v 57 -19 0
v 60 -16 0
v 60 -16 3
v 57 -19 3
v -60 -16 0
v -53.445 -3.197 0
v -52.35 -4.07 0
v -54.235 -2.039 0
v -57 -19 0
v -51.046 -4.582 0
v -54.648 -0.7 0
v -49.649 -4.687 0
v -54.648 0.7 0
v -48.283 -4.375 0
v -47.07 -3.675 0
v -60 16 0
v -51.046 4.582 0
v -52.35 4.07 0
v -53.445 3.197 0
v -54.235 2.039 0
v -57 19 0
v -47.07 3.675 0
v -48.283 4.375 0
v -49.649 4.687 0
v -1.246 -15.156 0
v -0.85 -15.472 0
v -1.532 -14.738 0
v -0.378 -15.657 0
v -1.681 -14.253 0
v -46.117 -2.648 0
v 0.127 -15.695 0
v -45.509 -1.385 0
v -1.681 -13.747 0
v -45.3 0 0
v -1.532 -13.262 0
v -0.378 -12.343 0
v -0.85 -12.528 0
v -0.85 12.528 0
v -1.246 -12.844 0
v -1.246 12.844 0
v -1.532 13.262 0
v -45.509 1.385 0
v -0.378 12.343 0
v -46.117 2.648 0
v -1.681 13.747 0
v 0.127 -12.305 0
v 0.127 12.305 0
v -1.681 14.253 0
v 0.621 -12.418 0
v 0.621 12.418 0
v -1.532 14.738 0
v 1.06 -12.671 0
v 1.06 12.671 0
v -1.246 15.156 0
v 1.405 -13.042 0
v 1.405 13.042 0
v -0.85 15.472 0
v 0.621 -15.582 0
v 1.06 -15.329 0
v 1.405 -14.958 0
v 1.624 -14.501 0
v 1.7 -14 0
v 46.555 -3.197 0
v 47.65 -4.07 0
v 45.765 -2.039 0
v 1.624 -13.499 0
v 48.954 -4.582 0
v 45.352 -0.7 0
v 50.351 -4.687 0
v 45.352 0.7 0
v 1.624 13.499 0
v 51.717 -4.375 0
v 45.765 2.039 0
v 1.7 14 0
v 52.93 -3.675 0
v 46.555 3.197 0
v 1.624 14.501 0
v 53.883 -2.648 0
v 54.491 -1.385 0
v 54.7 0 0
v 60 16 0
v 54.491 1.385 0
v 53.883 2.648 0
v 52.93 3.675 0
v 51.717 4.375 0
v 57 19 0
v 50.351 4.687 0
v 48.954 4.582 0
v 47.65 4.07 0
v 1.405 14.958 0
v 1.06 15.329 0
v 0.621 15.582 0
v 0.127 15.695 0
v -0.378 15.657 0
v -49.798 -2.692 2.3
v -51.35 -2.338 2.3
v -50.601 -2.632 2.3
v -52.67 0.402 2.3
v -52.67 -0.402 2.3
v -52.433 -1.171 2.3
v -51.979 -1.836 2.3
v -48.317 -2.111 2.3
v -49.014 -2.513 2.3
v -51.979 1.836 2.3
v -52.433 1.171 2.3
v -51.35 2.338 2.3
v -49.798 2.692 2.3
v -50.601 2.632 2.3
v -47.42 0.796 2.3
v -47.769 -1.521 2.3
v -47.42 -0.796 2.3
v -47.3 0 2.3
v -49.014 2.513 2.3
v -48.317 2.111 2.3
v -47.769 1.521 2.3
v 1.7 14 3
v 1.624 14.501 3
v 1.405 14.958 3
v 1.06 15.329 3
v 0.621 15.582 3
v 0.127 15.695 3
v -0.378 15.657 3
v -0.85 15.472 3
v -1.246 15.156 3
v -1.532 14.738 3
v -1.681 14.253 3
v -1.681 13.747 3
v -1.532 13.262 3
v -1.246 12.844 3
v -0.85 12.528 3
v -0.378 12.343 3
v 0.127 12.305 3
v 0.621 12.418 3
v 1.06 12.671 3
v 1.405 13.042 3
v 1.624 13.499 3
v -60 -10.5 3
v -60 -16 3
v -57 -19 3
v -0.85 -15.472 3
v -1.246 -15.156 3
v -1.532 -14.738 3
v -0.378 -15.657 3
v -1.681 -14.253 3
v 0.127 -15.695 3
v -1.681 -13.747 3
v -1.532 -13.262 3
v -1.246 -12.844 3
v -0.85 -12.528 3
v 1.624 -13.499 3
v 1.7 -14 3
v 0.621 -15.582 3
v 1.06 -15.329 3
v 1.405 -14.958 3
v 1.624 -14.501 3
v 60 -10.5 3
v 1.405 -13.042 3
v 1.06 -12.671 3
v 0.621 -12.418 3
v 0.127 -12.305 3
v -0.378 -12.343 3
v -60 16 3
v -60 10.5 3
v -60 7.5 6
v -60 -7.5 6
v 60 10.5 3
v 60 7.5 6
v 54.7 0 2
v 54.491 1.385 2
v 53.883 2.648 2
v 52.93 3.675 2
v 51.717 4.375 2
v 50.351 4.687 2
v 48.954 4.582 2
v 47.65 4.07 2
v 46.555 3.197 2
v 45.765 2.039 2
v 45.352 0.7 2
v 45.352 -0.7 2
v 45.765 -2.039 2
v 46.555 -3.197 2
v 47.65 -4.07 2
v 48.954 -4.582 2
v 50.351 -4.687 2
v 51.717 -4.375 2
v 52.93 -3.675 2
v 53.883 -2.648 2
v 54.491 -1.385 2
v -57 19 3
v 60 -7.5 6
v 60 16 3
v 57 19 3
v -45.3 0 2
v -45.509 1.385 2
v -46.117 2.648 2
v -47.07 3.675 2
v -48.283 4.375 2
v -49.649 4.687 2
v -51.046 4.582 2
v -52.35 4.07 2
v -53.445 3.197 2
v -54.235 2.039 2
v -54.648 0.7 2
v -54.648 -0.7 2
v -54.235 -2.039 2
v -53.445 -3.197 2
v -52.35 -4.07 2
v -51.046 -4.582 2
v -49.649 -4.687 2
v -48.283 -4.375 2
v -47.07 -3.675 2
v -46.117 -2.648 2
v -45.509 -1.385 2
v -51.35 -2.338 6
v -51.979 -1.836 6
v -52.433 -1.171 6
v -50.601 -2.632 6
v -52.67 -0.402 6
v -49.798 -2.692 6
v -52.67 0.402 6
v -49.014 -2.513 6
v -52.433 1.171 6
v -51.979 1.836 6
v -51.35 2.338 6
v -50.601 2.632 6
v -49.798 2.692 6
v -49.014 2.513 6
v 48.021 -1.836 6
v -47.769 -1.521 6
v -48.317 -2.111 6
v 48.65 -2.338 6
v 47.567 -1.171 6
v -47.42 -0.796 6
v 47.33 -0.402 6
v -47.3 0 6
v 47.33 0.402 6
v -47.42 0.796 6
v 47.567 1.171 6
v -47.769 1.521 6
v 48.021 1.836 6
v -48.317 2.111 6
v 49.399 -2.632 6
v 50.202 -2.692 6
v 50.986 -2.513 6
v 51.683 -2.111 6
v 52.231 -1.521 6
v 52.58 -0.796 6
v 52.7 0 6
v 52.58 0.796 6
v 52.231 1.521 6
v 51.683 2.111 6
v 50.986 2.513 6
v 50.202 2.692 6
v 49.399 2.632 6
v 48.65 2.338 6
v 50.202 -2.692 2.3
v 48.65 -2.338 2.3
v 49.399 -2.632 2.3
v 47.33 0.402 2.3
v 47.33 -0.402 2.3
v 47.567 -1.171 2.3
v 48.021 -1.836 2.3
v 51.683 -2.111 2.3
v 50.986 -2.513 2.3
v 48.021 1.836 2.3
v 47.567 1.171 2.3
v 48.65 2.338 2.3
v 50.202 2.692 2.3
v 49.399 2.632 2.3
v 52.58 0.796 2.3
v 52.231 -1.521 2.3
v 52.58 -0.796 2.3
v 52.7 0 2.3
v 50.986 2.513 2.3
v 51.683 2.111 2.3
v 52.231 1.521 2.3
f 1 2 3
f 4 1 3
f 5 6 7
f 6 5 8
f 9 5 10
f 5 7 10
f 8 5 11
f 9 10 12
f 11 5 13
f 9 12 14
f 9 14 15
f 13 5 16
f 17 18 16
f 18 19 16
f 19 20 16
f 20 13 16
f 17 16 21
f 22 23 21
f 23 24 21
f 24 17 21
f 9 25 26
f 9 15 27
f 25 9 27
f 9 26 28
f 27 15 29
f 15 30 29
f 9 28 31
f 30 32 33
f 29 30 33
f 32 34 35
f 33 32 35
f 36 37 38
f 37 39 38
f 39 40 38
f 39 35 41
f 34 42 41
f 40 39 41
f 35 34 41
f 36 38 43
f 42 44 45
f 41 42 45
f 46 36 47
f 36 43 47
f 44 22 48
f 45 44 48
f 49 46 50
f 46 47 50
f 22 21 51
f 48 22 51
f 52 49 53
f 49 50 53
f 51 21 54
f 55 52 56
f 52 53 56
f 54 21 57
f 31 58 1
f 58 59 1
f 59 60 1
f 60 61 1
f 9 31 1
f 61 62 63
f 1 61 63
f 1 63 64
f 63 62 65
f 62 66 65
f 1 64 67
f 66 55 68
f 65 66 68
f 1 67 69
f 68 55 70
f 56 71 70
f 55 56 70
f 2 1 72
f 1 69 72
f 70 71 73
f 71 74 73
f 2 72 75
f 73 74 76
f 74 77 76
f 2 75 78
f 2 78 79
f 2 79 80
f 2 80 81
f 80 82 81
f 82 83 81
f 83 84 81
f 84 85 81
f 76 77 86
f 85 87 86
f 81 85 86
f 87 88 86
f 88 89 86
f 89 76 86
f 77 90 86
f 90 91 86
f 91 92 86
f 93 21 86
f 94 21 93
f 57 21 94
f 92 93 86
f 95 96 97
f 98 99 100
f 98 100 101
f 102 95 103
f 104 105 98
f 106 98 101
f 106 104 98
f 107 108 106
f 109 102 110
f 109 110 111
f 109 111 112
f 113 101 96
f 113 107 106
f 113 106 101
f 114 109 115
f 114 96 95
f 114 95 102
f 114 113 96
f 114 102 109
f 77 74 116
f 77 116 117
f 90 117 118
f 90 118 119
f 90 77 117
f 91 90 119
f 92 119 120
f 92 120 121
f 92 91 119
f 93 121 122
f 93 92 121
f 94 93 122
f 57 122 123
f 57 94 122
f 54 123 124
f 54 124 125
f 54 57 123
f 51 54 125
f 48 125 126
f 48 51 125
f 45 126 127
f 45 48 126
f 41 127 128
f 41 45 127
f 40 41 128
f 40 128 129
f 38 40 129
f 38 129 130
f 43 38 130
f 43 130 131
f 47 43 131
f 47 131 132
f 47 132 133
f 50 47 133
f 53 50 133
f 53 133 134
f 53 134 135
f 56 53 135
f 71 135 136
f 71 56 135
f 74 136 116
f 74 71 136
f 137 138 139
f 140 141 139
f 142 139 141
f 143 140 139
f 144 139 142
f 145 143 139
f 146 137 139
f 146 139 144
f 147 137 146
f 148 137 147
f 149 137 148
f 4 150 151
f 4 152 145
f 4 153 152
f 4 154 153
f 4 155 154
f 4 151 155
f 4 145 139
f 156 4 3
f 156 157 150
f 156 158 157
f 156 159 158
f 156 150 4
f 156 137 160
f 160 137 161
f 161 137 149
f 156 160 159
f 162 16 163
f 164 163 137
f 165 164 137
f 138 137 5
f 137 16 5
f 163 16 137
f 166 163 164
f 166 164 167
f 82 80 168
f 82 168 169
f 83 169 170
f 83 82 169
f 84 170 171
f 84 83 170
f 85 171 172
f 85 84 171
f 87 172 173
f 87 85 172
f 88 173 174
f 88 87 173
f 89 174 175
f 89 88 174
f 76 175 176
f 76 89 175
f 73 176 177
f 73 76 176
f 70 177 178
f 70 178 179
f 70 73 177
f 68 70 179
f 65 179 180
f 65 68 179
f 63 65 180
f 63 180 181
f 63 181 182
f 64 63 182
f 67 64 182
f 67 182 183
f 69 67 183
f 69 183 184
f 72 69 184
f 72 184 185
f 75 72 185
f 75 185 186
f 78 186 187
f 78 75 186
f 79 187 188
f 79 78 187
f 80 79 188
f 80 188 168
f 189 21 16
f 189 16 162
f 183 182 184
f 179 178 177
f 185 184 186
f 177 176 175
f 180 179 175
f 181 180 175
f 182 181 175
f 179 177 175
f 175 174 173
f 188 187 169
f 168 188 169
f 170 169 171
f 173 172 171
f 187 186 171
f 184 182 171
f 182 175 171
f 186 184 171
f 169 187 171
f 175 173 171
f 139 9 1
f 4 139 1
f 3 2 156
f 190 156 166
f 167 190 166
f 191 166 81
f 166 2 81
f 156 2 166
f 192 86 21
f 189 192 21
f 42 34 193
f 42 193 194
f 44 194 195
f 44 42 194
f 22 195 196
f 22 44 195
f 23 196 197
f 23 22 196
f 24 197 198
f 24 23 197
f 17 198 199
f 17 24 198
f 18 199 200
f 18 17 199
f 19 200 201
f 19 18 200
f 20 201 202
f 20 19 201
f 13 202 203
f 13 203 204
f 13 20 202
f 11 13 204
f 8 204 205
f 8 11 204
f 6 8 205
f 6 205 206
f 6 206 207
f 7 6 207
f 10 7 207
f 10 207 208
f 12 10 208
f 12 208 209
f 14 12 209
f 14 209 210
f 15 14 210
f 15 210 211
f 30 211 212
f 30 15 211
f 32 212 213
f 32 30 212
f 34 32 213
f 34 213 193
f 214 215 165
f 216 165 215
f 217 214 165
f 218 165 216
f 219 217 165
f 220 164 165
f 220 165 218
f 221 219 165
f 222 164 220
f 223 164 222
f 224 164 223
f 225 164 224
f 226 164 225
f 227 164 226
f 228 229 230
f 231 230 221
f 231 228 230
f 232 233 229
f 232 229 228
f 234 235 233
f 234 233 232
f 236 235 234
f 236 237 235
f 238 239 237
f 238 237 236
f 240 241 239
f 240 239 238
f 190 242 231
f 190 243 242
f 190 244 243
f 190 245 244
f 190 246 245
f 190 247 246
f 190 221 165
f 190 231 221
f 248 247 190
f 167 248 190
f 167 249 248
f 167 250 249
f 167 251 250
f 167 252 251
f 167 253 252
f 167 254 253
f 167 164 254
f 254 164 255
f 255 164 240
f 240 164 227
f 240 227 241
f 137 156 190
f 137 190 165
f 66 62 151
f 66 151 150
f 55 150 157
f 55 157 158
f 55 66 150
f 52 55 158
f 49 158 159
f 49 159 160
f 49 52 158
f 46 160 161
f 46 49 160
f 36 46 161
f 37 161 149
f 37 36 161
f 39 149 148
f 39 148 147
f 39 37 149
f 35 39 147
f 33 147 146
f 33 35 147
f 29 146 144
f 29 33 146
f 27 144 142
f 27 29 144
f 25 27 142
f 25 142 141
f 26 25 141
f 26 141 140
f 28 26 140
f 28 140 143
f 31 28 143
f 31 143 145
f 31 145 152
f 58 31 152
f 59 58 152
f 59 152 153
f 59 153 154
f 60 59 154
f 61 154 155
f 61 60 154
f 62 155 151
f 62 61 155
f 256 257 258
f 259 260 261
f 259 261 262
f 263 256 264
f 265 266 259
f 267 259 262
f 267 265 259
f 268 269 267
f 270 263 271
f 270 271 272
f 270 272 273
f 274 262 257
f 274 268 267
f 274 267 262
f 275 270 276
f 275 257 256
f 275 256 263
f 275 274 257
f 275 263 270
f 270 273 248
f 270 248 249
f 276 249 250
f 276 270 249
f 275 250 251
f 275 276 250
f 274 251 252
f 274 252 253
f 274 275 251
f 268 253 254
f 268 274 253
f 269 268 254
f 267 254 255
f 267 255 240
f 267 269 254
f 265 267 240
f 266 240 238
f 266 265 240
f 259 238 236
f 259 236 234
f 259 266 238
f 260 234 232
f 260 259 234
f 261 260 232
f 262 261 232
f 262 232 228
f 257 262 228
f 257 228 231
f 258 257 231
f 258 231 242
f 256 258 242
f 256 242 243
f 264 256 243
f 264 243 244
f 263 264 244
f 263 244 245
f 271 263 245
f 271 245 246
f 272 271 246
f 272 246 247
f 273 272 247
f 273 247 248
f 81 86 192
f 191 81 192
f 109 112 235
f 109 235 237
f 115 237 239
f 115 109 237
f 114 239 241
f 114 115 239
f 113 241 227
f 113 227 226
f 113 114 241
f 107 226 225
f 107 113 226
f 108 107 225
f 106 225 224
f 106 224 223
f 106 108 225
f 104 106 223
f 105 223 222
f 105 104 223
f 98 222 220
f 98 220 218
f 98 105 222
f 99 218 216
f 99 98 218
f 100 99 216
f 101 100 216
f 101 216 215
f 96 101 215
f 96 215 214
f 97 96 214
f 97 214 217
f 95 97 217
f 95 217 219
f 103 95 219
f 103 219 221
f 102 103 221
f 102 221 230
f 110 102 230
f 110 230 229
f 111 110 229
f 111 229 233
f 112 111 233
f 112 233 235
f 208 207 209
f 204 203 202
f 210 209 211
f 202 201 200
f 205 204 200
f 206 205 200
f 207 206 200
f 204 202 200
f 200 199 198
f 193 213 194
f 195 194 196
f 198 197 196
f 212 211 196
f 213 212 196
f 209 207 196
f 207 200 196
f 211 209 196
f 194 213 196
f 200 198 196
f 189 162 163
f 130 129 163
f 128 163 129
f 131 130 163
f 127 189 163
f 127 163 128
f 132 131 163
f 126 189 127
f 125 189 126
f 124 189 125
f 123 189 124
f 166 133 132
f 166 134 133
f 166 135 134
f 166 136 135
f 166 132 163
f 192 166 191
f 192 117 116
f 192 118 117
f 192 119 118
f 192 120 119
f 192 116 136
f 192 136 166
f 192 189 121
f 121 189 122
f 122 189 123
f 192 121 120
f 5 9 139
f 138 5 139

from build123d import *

# Parameters (mm, degrees)
F0_R     = 1.7
F1_DEPTH = 3
F0_R_2   = 4.7
F0_R_3   = 2.7
F2_DEPTH = 6
F3_DEPTH = 2
F4_SIZE  = 2.99999
F5_START = 2
F5_DEPTH = 0.3


# Not quite as in the source:
# - a fillet or chamfer is up to 0.001 mm smaller than in the source, because OpenCascade refuses the exact size


with BuildPart() as f1:
    # F0 (on Top) → F1 (new body)
    with BuildSketch(Plane.XY):
        Polygon((12.5, 19), (-12.5, 19), (-60, 19), (-60, 7.5), (-12.5, 7.5), (12.5, 7.5), (60, 7.5), (60, 19), align=None)
        with Locations((0, 14)):
            Circle(F0_R, mode=Mode.SUBTRACT)
    extrude(amount=F1_DEPTH)



with BuildPart() as f1b:
    # F0 (on Top) → F1, piece 2 (new body)
    with BuildSketch(Plane.XY):
        Polygon((-12.5, -7.5), (-60, -7.5), (-60, -19), (-8.9196664095, -19), (8.9196664095, -19), (16.0803335905, -19), (60, -19), (60, -7.5), (12.5, -7.5), align=None)
        with Locations((0, -14)):
            Circle(F0_R, mode=Mode.SUBTRACT)
    extrude(amount=F1_DEPTH)


with BuildPart() as f1_1:
    add(f1.part)

    add(f1b.part)  # F2 merges F1b
    # F0 (on Top) → F2 (join)
    with BuildSketch(Plane.XY):
        Polygon((-12.5, 7.5), (-60, 7.5), (-60, -7.5), (-12.5, -7.5), (12.5, -7.5), (60, -7.5), (60, 7.5), (12.5, 7.5), align=None)
        with Locations((-50, 0)):
            Circle(F0_R_2, mode=Mode.SUBTRACT)
        with Locations((50, 0)):
            Circle(F0_R_2, mode=Mode.SUBTRACT)
        with Locations((-50, 0)):
            Circle(F0_R_2)
        with Locations((-50, 0)):
            Circle(F0_R_3, mode=Mode.SUBTRACT)
        with Locations((50, 0)):
            Circle(F0_R_2)
        with Locations((50, 0)):
            Circle(F0_R_3, mode=Mode.SUBTRACT)
    extrude(amount=F2_DEPTH)

    # F0 (on Top) → F3 (cut)
    with BuildSketch(Plane.XY):
        with Locations((-50, 0)):
            Circle(F0_R_2)
        with Locations((-50, 0)):
            Circle(F0_R_3, mode=Mode.SUBTRACT)
        with Locations((50, 0)):
            Circle(F0_R_2)
        with Locations((50, 0)):
            Circle(F0_R_3, mode=Mode.SUBTRACT)
    extrude(amount=F3_DEPTH, mode=Mode.SUBTRACT)

    # F4 (size 3 in the source; OpenCascade refuses exactly that, so slightly less here)
    f4_edges = [f1_1.edges().sort_by_distance(p)[0] for p in [
        (0, 7.5, 3),
        (0, -7.5, 3),
        (-60, -19, 1.5),
        (-60, 19, 1.5),
        (60, -19, 1.5),
        (60, 19, 1.5),
    ]]
    chamfer(f4_edges, length=F4_SIZE)

    # F0 (on Top) → F5 (join)
    with BuildSketch(Plane.XY.offset(F5_START)):
        with Locations((-50, 0)):
            Circle(F0_R_3)
        with Locations((50, 0)):
            Circle(F0_R_3)
    extrude(amount=F5_DEPTH)


solid = f1_1.part
